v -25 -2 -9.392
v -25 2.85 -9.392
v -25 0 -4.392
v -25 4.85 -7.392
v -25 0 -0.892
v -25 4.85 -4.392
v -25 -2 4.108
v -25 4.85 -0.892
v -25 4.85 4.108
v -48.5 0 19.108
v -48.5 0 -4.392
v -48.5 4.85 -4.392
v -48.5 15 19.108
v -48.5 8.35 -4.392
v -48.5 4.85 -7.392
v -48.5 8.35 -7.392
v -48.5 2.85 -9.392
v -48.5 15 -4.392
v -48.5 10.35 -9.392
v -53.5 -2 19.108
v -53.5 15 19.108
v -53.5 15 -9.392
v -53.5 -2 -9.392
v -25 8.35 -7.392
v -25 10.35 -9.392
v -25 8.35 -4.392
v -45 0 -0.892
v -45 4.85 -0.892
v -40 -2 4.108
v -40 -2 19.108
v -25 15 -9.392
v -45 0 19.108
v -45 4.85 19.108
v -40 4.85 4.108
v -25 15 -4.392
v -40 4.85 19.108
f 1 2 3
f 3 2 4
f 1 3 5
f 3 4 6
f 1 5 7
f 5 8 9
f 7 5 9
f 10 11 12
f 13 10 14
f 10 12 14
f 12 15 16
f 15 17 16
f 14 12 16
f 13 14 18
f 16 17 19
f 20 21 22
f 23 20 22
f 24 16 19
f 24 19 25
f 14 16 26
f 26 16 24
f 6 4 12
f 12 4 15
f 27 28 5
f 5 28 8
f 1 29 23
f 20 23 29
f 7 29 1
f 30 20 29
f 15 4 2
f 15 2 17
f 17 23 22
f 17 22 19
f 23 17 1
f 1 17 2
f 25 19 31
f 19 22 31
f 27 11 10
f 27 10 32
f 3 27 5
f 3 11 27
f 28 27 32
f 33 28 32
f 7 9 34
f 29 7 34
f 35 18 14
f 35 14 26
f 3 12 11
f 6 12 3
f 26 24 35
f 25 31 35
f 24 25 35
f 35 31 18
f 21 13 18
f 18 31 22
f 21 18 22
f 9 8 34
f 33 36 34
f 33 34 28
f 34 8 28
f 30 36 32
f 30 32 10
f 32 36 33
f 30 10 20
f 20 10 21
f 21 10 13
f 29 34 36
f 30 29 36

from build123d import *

# Parameters (mm, degrees)
BOSS_EXTRUDE1_DEPTH     = 15
BOSS_EXTRUDE2_DEPTH     = 2
CUT_EXTRUDE1_DEPTH      = 10.15
CUT_EXTRUDE2_DEPTH      = 4.85
CUT_EXTRUDE5_DEPTH      = 37.462309307
CUT_EXTRUDE5_DEPTH_BACK = 37.462309307
CHAMFER3_SIZE           = 2
CUT_EXTRUDE6_DEPTH      = 60.299036748
CUT_EXTRUDE6_DEPTH_BACK = 60.299036748
SKETCH6_W               = 39.703071578
SKETCH6_H               = 42.363425718


with BuildPart() as part:
    # Sketch1 → Boss-Extrude1 (new body)
    with BuildSketch(Plane(origin=(0, 0, 0), x_dir=(1, 0, 0), z_dir=(0, 1, 0))):
        Polygon((23.5, 9.391735838), (-5, 9.391735838), (-5, -4.108264162), (10, -4.108264162), (10, -19.108264162), (23.5, -19.108264162), align=None)
        Polygon((0, 4.391735838), (0, 0.891735838), (15, 0.891735838), (15, -14.108264162), (18.5, -14.108264162), (18.5, 4.391735838), align=None, mode=Mode.SUBTRACT)
    extrude(amount=BOSS_EXTRUDE1_DEPTH)

    # Sketch2 → Boss-Extrude2 (add)
    with BuildSketch(Plane.XZ):
        Polygon((-5, 4.108264162), (10, 4.108264162), (10, 19.108264162), (23.5, 19.108264162), (23.5, -9.391735838), (-5, -9.391735838), align=None)
    extrude(amount=BOSS_EXTRUDE2_DEPTH)

    # Sketch3 → Cut-Extrude1 (cut)
    with BuildSketch(Plane(origin=(0, 15, 0), x_dir=(1, 0, 0), z_dir=(0, 1, 0))):
        Polygon((18.5, 4.391735838), (-5, 4.391735838), (-5, 0.891735838), (-5, -4.108264162), (10, -4.108264162), (10, -19.108264162), (15, -19.108264162), (18.5, -19.108264162), align=None)
    extrude(amount=-CUT_EXTRUDE1_DEPTH, mode=Mode.SUBTRACT)

    # Sketch4 → Cut-Extrude2 (cut)
    with BuildSketch(Plane(origin=(0, 4.85, 0), x_dir=(1, 0, 0), z_dir=(0, 1, 0))):
        Polygon((-5, 4.391735838), (18.5, 4.391735838), (18.5, -19.108264162), (15, -19.108264162), (15, 0.891735838), (-5, 0.891735838), align=None)
    extrude(amount=-CUT_EXTRUDE2_DEPTH, mode=Mode.SUBTRACT)

    # Sketch5 → Cut-Extrude5 (cut, two sides: drawn at the far end of the back side and taken through both)
    with BuildSketch(Plane.XY.offset(-4.391735838).offset(-CUT_EXTRUDE5_DEPTH_BACK)):
        Polygon((-5, 4.85), (18.5, 4.85), (18.5, 8.35), (-10.741212184, 8.35), (-10.741212184, 4.85), align=None)
    extrude(amount=CUT_EXTRUDE5_DEPTH + CUT_EXTRUDE5_DEPTH_BACK, mode=Mode.SUBTRACT)

    # Chamfer3
    chamfer3_edges = [part.edges().sort_by_distance(p)[0] for p in [
        (6.75, 8.35, -9.391735838),
        (6.75, 4.85, -9.391735838),
    ]]
    chamfer(chamfer3_edges, length=CHAMFER3_SIZE)


with BuildPart() as body_2:
    # Mirror1: mirrored copy
    add(part.part.mirror(Plane.ZY.offset(15)))


with BuildPart() as part_1:
    add(part.part)

    # Sketch6 → Cut-Extrude6 (cut, two sides: drawn at the far end of the back side and taken through both)
    with BuildSketch(Plane(origin=(0, 15, 0), x_dir=(1, 0, 0), z_dir=(0, 1, 0)).offset(-CUT_EXTRUDE6_DEPTH_BACK)):
        with Locations((10, -4.108264162)):
            Rectangle(SKETCH6_W, SKETCH6_H)
    extrude(amount=CUT_EXTRUDE6_DEPTH + CUT_EXTRUDE6_DEPTH_BACK, mode=Mode.SUBTRACT)


solid = body_2.part
